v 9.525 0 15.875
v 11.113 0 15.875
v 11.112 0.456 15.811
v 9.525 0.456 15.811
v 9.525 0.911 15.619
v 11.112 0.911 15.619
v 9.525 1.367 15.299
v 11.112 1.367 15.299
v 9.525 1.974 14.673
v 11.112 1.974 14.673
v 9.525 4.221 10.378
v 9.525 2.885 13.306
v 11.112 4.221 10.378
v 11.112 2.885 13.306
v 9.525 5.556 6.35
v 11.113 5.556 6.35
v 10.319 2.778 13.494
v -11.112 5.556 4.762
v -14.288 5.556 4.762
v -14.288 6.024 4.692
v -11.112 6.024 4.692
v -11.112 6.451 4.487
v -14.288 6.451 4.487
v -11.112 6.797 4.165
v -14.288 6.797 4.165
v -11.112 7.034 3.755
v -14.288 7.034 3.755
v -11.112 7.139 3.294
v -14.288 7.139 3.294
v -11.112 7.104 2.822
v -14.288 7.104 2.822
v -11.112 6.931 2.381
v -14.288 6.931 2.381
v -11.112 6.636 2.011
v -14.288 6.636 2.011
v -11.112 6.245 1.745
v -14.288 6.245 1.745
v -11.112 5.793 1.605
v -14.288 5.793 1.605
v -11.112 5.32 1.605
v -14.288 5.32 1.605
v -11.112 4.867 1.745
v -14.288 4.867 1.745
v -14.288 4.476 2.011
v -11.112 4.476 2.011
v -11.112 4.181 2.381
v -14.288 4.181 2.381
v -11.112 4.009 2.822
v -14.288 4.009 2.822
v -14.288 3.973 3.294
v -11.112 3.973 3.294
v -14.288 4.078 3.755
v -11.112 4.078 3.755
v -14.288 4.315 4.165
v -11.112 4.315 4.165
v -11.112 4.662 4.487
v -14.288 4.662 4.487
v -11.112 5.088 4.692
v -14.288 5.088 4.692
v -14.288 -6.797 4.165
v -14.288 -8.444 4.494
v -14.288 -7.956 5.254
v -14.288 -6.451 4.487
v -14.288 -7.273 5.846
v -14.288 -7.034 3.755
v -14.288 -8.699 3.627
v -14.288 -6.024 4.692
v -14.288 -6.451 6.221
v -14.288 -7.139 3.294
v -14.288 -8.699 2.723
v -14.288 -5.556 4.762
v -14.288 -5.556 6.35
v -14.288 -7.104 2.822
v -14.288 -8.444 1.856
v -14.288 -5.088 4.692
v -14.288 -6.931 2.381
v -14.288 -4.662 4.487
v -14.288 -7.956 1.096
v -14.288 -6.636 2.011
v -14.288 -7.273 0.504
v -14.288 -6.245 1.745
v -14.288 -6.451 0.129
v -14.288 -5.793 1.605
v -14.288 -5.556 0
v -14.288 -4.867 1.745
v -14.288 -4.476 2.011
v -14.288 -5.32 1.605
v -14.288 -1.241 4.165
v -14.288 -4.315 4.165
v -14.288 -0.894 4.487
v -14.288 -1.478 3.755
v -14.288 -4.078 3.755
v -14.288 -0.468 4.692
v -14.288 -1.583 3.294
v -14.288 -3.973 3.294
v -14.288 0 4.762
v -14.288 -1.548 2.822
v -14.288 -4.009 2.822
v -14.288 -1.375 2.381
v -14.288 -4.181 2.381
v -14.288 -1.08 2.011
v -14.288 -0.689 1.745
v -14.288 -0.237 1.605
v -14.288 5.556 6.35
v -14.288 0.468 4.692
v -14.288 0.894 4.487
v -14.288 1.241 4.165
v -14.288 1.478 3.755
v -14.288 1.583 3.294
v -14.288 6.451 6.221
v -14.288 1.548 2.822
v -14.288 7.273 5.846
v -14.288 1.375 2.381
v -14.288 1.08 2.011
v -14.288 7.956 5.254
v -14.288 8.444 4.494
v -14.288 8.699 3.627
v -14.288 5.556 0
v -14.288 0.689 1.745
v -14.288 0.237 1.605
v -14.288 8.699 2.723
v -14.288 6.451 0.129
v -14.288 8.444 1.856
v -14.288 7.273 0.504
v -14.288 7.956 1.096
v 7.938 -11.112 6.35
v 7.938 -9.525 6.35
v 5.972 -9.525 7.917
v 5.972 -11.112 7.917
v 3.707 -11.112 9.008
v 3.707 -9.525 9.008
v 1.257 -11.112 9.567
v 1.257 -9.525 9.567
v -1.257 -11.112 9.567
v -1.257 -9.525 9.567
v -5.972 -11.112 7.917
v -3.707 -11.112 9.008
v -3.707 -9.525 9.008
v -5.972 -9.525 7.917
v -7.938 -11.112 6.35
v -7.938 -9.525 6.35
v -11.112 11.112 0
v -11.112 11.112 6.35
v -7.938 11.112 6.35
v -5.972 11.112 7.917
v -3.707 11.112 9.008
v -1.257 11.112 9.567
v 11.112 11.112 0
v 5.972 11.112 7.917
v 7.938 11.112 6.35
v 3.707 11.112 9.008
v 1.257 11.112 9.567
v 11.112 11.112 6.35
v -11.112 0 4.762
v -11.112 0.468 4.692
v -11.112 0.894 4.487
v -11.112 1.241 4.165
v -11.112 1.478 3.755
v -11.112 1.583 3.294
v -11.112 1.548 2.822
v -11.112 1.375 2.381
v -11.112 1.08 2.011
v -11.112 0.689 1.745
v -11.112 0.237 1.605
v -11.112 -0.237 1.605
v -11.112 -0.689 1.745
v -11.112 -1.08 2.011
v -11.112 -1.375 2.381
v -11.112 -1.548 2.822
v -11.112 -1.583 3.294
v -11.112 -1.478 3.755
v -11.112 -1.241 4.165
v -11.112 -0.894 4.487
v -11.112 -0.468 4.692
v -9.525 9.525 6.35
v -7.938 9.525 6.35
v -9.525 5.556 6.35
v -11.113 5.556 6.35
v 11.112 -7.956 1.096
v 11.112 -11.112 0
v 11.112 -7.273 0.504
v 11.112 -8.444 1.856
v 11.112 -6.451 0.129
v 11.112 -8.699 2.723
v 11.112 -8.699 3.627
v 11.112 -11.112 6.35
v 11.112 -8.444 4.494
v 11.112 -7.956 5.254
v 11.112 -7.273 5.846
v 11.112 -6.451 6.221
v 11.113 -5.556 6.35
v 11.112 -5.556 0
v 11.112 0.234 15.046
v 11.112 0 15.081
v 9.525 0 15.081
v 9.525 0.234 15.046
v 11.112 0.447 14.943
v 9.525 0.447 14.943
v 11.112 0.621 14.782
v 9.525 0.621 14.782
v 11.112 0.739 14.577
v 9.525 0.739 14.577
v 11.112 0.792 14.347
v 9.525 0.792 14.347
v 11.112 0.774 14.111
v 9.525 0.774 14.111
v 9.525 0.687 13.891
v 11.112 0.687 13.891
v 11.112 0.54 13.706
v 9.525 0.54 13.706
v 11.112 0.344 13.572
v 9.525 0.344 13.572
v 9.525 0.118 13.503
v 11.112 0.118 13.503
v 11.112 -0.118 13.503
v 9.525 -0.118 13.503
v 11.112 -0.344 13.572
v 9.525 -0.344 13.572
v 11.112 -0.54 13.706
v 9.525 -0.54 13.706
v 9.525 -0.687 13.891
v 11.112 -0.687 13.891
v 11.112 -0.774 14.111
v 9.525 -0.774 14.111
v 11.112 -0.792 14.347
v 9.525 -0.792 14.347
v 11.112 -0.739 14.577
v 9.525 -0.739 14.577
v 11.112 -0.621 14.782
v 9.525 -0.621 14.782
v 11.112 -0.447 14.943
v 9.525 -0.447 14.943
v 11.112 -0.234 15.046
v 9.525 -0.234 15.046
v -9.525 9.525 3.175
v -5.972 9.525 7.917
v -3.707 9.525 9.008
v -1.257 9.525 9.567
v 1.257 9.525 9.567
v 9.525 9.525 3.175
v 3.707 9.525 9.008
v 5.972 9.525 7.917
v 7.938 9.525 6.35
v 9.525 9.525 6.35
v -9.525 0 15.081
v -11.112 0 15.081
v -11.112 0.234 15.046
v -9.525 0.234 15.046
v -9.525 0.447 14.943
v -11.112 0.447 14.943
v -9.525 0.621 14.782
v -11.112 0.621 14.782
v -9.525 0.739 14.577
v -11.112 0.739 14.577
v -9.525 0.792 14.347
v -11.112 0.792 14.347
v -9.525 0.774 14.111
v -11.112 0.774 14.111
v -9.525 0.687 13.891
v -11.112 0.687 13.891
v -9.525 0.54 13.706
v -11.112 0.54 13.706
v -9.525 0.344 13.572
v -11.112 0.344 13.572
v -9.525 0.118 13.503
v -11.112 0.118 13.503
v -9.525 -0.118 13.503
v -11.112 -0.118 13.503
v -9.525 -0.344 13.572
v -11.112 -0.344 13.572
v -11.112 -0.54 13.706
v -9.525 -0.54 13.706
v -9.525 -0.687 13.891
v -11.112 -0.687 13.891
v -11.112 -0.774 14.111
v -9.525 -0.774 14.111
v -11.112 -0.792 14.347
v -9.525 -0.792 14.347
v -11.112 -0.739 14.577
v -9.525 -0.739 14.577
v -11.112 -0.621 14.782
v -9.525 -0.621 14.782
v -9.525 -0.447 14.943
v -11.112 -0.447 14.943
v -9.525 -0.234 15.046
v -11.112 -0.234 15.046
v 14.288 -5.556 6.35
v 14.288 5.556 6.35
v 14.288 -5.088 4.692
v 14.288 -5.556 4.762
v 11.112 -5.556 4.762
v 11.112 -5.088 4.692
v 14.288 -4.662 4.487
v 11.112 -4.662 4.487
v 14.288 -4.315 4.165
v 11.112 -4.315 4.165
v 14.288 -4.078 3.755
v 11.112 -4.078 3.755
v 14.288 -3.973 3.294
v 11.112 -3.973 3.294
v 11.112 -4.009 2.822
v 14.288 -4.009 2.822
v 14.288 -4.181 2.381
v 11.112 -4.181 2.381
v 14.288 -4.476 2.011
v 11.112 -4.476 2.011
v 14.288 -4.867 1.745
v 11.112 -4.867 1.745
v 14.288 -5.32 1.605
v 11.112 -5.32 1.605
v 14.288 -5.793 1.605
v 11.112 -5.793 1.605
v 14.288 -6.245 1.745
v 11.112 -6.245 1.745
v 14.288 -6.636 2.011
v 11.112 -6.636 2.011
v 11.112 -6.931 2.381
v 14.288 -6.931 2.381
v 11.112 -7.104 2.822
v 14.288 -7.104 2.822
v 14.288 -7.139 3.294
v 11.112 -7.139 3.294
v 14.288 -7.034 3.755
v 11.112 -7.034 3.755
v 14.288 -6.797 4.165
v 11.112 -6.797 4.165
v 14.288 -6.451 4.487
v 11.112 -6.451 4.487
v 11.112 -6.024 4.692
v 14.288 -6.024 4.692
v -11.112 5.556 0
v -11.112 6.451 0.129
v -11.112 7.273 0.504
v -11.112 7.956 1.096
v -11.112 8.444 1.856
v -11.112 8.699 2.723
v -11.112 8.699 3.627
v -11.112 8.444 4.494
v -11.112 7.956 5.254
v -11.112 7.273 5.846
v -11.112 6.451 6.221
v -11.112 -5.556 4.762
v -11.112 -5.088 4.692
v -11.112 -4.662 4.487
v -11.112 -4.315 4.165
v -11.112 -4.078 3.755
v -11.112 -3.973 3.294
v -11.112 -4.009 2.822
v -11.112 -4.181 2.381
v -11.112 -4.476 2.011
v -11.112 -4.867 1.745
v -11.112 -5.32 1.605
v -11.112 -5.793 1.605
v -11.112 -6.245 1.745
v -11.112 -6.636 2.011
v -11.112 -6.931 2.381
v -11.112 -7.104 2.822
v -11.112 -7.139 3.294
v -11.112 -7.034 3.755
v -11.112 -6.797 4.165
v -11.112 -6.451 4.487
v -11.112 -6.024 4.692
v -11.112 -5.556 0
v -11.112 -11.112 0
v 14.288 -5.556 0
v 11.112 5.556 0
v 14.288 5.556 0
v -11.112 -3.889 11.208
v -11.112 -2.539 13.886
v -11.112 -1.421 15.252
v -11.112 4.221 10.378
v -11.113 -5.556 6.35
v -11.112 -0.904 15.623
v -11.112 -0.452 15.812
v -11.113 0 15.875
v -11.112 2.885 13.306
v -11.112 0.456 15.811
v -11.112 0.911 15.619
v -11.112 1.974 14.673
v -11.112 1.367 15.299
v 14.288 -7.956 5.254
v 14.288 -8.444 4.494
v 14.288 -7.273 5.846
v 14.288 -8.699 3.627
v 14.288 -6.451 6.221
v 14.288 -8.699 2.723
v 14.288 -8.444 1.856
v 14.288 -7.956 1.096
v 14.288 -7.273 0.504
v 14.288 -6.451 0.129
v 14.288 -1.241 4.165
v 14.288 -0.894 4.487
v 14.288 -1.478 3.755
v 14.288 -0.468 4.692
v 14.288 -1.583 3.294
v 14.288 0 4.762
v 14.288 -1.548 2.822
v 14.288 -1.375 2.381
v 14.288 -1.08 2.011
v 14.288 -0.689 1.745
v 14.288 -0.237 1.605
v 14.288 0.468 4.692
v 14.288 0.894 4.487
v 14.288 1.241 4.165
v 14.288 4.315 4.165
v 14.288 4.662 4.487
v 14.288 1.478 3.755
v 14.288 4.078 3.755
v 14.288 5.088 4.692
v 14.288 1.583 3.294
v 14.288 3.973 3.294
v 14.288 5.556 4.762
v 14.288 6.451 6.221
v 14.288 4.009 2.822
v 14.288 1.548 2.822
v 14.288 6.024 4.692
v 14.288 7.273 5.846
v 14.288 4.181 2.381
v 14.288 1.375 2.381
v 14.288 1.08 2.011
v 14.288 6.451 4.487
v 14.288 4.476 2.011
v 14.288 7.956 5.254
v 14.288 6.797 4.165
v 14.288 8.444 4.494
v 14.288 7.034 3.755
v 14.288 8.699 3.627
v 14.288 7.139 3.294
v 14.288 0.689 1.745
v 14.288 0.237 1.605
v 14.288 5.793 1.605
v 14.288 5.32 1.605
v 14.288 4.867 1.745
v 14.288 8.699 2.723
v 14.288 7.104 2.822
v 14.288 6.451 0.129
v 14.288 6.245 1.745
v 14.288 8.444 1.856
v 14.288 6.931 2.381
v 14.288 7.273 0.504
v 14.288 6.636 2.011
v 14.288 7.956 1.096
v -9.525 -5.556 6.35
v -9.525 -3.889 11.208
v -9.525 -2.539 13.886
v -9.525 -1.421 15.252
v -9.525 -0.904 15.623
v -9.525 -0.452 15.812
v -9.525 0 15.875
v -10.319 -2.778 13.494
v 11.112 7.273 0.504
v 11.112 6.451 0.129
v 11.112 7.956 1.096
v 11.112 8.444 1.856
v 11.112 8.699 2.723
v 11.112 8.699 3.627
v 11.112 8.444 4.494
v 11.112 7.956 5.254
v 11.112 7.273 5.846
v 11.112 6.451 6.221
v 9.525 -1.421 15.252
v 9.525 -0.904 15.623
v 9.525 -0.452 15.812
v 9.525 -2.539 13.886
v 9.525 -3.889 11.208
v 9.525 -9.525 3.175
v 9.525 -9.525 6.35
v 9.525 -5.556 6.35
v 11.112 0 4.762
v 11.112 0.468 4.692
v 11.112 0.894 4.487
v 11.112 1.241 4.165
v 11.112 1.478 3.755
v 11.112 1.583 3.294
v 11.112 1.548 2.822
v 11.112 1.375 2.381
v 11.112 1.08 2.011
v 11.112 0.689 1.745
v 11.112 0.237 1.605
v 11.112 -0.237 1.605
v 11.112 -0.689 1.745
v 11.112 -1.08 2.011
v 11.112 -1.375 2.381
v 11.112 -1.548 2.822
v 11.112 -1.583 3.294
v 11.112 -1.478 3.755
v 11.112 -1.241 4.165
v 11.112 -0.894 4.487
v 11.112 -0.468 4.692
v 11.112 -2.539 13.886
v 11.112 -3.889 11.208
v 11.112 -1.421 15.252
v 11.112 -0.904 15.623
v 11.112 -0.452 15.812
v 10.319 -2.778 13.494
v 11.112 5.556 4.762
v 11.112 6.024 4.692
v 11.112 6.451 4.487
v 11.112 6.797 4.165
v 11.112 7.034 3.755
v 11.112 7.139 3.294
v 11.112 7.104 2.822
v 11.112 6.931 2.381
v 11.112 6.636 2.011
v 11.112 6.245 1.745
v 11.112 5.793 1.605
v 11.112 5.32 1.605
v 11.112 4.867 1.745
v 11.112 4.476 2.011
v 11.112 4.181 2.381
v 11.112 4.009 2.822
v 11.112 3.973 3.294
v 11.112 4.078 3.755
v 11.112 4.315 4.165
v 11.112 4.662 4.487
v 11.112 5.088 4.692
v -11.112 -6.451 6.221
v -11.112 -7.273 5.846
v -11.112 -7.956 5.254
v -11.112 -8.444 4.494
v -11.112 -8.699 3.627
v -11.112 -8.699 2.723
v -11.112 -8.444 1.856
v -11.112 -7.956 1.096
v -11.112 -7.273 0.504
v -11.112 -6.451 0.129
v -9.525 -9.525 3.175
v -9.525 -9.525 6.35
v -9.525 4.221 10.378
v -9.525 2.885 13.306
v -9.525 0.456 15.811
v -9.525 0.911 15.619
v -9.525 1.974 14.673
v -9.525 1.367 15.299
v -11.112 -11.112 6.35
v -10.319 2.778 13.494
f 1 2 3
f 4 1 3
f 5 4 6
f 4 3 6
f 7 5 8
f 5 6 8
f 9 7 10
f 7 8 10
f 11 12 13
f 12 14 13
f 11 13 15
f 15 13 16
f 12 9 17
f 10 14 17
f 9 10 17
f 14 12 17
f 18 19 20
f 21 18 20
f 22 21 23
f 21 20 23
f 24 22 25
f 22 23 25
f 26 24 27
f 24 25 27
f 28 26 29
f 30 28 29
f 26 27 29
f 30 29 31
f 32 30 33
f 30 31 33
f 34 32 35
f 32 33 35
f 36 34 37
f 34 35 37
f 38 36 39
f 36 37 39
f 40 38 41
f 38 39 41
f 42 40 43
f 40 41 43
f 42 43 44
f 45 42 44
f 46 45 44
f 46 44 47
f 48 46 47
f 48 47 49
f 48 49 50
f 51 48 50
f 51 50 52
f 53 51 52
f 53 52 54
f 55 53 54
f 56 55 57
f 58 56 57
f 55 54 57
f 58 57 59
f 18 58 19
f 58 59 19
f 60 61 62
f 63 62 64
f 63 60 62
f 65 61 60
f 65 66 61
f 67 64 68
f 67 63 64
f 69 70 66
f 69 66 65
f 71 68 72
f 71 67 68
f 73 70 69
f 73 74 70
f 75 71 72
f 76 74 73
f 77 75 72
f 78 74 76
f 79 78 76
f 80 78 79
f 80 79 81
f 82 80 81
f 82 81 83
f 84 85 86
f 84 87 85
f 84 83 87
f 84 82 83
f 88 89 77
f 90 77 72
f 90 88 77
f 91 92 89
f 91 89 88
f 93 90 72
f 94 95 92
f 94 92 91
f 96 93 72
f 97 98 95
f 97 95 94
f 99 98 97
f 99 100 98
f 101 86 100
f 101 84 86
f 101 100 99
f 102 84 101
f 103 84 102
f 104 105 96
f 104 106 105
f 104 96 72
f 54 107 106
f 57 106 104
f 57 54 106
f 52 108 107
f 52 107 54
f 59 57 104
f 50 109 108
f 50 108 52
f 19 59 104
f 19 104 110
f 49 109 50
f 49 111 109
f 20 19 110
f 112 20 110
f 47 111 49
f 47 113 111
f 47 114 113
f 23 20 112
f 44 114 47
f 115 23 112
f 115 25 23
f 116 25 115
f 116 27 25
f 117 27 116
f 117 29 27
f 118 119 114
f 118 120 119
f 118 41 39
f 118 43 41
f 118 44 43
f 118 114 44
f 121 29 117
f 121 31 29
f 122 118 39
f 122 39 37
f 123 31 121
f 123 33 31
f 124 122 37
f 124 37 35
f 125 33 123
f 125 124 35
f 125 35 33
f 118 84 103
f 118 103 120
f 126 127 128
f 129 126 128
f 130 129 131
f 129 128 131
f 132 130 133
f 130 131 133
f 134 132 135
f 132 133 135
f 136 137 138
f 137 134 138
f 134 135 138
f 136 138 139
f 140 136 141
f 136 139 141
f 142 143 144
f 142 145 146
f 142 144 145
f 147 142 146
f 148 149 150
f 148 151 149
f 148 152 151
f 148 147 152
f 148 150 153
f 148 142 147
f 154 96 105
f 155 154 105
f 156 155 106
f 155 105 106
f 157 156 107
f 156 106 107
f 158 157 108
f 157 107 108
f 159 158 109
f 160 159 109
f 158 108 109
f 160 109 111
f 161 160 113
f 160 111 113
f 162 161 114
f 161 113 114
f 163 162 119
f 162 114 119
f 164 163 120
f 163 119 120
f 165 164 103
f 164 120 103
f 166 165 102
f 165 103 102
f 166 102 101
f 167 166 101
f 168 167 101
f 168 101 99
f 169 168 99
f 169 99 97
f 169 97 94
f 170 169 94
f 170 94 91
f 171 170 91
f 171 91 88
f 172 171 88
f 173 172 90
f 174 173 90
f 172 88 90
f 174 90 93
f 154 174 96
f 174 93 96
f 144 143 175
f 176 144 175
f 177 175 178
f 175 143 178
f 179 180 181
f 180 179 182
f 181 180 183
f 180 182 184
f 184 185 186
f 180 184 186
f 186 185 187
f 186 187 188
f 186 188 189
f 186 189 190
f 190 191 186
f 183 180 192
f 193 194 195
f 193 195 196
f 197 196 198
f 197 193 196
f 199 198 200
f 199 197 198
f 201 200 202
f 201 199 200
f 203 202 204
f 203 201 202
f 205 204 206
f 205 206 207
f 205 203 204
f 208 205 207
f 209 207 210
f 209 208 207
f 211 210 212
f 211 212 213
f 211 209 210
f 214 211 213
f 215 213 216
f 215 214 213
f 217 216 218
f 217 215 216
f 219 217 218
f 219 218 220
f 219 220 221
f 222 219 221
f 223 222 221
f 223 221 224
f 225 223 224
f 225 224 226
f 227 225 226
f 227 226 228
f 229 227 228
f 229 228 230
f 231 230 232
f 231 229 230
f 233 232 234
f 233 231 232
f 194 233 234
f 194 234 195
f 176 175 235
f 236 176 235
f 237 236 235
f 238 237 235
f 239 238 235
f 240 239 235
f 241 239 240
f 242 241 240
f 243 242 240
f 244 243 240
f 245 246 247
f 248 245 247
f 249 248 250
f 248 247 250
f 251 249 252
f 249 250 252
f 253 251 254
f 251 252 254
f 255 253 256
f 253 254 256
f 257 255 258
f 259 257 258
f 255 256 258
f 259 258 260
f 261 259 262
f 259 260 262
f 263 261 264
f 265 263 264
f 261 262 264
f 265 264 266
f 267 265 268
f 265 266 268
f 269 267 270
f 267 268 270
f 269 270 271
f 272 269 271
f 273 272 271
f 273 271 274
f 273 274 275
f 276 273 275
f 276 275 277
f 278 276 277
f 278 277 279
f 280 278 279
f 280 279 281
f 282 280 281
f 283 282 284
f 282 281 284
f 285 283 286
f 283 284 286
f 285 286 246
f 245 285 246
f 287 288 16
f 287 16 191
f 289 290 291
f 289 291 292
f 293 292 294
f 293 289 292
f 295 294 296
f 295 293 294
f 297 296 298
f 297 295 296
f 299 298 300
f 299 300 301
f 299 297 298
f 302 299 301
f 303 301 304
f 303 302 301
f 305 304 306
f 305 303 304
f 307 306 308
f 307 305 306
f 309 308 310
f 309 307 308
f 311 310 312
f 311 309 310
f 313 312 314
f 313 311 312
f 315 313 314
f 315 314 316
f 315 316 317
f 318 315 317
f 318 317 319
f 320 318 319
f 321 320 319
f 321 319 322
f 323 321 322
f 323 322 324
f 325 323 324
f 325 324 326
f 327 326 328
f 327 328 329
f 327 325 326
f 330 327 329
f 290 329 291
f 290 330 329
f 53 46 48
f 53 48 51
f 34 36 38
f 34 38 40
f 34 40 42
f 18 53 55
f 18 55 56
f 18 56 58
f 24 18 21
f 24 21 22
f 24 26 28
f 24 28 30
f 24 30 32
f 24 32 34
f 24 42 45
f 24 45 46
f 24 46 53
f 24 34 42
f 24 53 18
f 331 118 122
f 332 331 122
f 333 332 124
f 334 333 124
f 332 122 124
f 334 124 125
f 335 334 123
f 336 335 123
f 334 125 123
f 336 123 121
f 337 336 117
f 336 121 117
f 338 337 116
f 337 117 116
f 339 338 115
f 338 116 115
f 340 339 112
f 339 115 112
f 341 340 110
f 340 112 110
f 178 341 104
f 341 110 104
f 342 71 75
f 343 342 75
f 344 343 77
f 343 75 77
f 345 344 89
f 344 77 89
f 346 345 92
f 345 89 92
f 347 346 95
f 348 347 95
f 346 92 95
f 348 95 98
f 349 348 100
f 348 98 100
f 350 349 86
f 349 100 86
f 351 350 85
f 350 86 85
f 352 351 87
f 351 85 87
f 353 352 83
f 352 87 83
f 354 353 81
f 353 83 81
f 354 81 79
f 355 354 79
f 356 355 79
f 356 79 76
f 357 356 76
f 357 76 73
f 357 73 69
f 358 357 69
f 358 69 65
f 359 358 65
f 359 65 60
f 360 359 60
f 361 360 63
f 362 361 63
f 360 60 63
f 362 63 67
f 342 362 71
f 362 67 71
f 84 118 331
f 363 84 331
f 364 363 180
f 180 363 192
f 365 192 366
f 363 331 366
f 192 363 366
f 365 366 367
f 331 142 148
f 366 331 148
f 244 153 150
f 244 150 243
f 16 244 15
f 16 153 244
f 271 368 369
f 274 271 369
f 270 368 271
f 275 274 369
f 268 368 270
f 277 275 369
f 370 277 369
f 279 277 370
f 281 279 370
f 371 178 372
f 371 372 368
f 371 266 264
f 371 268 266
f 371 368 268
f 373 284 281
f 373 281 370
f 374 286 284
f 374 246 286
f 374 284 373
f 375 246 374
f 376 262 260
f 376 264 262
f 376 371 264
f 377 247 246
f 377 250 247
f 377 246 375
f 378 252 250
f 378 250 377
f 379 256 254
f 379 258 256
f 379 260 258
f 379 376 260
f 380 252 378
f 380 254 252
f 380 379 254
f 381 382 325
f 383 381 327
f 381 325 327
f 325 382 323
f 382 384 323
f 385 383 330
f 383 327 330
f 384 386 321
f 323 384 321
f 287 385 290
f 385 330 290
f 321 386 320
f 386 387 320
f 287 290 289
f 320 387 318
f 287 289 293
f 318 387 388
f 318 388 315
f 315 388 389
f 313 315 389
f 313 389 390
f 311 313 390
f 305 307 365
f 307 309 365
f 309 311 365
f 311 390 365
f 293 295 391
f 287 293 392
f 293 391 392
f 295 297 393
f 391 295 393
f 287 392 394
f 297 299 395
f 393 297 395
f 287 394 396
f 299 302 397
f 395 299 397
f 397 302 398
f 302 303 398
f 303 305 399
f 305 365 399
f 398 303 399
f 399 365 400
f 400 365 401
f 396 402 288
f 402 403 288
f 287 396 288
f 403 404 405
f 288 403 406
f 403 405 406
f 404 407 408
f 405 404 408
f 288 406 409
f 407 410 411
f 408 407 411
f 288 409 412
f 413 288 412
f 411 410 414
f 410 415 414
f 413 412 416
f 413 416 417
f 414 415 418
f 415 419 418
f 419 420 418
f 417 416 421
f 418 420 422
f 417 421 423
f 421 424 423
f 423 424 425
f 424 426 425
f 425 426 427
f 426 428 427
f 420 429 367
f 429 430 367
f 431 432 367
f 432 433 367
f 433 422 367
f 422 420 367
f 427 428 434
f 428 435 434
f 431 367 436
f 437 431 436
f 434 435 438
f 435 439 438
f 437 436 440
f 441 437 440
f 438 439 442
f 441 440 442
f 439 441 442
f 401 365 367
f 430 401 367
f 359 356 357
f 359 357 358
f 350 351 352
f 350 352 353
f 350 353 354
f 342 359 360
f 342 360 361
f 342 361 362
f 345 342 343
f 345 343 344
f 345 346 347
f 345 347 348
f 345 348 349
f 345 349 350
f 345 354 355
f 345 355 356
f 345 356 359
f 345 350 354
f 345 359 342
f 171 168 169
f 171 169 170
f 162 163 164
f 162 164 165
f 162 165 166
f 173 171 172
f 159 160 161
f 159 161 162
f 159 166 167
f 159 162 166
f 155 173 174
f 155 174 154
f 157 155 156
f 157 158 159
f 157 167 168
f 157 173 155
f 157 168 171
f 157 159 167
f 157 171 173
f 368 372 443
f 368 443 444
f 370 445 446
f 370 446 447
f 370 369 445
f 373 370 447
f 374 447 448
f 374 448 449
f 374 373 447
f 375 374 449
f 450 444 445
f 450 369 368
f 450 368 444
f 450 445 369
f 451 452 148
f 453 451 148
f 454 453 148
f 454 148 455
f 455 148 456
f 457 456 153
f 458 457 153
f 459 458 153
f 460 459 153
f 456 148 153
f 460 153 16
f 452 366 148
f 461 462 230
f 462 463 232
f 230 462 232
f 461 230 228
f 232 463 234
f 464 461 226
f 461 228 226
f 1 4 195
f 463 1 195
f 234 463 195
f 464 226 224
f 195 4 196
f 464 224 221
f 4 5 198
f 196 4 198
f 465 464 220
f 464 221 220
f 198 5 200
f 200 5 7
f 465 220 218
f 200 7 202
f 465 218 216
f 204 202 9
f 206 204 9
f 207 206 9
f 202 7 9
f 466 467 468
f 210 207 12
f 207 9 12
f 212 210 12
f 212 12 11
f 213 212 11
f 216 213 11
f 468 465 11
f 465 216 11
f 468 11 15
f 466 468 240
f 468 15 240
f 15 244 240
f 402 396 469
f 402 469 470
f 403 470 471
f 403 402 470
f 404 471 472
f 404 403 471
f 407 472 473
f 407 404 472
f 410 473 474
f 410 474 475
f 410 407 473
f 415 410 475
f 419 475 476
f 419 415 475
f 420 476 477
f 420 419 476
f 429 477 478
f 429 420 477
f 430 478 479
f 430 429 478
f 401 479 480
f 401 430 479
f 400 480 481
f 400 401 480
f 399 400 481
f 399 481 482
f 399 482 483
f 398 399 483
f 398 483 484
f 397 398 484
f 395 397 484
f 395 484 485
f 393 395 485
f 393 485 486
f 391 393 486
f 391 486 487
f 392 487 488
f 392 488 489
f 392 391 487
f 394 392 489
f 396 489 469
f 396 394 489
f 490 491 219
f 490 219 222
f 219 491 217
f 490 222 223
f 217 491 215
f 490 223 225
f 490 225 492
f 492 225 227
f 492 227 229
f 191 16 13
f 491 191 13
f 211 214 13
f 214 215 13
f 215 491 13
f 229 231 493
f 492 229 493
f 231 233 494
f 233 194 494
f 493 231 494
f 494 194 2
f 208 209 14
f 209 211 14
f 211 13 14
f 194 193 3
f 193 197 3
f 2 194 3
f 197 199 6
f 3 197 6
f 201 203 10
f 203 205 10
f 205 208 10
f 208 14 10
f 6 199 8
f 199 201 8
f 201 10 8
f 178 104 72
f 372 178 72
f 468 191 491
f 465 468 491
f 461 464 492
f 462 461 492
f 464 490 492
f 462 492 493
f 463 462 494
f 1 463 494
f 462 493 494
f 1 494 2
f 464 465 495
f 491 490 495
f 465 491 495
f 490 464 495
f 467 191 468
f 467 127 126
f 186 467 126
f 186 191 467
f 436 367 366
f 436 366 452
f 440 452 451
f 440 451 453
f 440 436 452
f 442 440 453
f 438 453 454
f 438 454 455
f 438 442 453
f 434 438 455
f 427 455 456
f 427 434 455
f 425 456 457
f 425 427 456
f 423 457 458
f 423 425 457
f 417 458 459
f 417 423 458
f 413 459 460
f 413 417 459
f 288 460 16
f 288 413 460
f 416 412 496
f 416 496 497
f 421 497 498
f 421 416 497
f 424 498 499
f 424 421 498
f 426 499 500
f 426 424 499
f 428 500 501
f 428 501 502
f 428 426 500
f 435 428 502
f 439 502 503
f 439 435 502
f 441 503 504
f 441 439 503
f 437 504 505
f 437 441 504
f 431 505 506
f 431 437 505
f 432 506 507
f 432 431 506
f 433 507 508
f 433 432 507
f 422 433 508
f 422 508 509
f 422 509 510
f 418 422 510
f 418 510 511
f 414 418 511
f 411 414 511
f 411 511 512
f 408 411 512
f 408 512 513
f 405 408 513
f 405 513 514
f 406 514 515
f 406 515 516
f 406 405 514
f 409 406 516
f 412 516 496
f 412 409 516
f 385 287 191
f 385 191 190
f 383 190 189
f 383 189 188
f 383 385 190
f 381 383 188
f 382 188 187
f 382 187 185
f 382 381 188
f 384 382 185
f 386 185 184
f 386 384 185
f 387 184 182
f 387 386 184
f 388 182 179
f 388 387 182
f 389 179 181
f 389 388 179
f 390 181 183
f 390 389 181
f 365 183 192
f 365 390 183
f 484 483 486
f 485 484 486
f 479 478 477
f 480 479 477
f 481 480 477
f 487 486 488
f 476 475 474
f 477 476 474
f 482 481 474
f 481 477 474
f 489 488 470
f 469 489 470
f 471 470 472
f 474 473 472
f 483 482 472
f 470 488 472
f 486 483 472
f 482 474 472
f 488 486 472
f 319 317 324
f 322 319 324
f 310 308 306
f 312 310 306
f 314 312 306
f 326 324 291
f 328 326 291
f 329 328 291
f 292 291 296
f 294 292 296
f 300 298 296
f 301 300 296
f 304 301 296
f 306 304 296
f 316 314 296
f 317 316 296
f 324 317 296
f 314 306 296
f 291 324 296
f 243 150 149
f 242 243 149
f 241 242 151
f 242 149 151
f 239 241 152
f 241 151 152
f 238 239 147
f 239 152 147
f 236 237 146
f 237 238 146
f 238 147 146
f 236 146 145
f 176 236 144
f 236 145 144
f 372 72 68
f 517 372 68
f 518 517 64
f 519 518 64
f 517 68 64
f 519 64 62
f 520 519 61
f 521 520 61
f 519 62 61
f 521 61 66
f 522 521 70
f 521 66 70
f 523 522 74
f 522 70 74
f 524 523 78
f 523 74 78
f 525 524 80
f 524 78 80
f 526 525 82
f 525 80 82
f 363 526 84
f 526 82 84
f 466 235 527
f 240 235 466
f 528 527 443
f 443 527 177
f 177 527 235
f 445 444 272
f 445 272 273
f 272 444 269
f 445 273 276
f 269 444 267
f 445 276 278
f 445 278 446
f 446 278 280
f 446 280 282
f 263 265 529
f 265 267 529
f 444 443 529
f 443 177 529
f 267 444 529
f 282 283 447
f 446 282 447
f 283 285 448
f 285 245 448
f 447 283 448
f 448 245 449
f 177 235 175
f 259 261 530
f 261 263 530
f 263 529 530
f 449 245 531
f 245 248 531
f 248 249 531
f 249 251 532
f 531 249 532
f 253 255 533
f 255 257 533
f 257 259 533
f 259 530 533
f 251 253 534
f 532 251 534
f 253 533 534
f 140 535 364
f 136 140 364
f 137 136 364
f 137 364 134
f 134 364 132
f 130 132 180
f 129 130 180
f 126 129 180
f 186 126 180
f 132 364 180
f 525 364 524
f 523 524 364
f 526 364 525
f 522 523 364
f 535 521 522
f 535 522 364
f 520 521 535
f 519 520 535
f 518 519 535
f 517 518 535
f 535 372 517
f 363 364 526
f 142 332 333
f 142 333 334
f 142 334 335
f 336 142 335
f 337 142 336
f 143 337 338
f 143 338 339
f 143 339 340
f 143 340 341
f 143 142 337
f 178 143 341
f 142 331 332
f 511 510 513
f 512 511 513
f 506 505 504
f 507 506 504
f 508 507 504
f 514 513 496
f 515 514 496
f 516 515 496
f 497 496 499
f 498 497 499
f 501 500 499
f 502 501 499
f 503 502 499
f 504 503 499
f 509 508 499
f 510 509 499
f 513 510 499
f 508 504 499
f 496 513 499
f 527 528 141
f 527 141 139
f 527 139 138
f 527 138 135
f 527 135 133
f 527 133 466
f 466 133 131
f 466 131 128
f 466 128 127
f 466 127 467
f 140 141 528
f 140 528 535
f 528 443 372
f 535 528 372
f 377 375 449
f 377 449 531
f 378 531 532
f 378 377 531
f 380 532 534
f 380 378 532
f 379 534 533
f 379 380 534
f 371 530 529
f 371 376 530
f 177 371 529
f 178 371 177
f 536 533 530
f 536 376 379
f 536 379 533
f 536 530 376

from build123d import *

# Parameters (mm, degrees)
SKETCH2_W           = 28.575
SKETCH2_H           = 22.225
BOSS_EXTRUDE1_DEPTH = 15.875
SKETCH5_W           = 19.05
SKETCH5_H           = 19.05
CUT_EXTRUDE3_DEPTH  = 12.7
SKETCH4_R           = 1.5875
CUT_EXTRUDE2_DEPTH  = 3.175
CUT_EXTRUDE1_DEPTH  = 23.225
SKETCH6_R           = 0.79375
CUT_EXTRUDE4_DEPTH  = 1.5875


with BuildPart() as part:
    # Sketch2 → Boss-Extrude1 (new body)
    with BuildSketch(Plane.XY):
        Rectangle(SKETCH2_W, SKETCH2_H)
    extrude(amount=BOSS_EXTRUDE1_DEPTH)

    # Sketch5 → Cut-Extrude3 (cut)
    with BuildSketch(Plane.XY.offset(15.875)):
        Rectangle(SKETCH5_W, SKETCH5_H)
    extrude(amount=-CUT_EXTRUDE3_DEPTH, mode=Mode.SUBTRACT)

    # Sketch4 → Cut-Extrude2 (cut)
    with BuildSketch(Plane.ZY.offset(14.2875)):
        with BuildLine():
            ThreePointArc((6.35, -5.55625), (3.175, -8.73125), (0, -5.55625))
            Line((0, -5.55625), (0, -11.1125))
            Line((0, -11.1125), (15.875, -11.1125))
            Line((15.875, -11.1125), (15.875, 11.1125))
            Line((15.875, 11.1125), (0, 11.1125))
            Line((0, 11.1125), (0, 5.55625))
            ThreePointArc((0, 5.55625), (3.175, 8.73125), (6.35, 5.55625))
            Line((6.35, 5.55625), (6.35, -5.55625))
        make_face()
        with Locations((3.175, 5.55625)):
            Circle(SKETCH4_R)
        with Locations((3.175, 0)):
            Circle(SKETCH4_R)
        with Locations((3.175, -5.55625)):
            Circle(SKETCH4_R)
    cut_extrude2 = extrude(amount=-CUT_EXTRUDE2_DEPTH, mode=Mode.SUBTRACT)

    # Mirror1: Cut-Extrude2 across plane
    add(cut_extrude2.mirror(Plane(origin=(0, 0, 0), x_dir=(0, 0, 1), z_dir=(1, 0, 0))), mode=Mode.SUBTRACT)

    # Sketch3 → Cut-Extrude1 (cut, through all)
    with BuildSketch(Plane(origin=(0, 11.1125, 0), x_dir=(1, 0, 0), z_dir=(0, 1, 0))):
        with BuildLine():
            Line((-7.9375, -6.35), (-9.525, -6.35))
            Line((-9.525, -6.35), (-9.525, -15.875))
            Line((-9.525, -15.875), (9.525, -15.875))
            Line((9.525, -15.875), (9.525, -6.35))
            Line((9.525, -6.35), (7.9375, -6.35))
            ThreePointArc((7.9375, -6.35), (0, -9.637820151), (-7.9375, -6.35))
        make_face()
    extrude(amount=-CUT_EXTRUDE1_DEPTH, mode=Mode.SUBTRACT)

    # Sketch6 → Cut-Extrude4 (cut)
    with BuildSketch(Plane.ZY.offset(11.1125)):
        with BuildLine():
            Line((15.875, -11.1125), (15.875, 0))
            add(Edge.make_bspline(
                [(6.35, -5.55625), (15.875, -2.778125), (15.875, 0)],
                knots=[0, 0, 0, 0.5, 0.5, 0.5], degree=2))
            Line((6.35, -5.55625), (6.35, -11.1125))
            Line((6.35, -11.1125), (15.875, -11.1125))
        make_face()
        with BuildLine():
            Line((6.35, 11.1125), (6.35, 5.55625))
            add(Edge.make_bspline(
                [(15.875, 0), (15.875, 2.778125), (6.35, 5.55625)],
                knots=[0.5, 0.5, 0.5, 1, 1, 1], degree=2))
            Line((15.875, 0), (15.875, 11.1125))
            Line((15.875, 11.1125), (6.35, 11.1125))
        make_face()
        with Locations((14.2875, 0)):
            Circle(SKETCH6_R)
    cut_extrude4 = extrude(amount=-CUT_EXTRUDE4_DEPTH, mode=Mode.SUBTRACT)

    # Mirror2: Cut-Extrude4 across plane
    add(cut_extrude4.mirror(Plane(origin=(0, 0, 0), x_dir=(0, 0, 1), z_dir=(1, 0, 0))), mode=Mode.SUBTRACT)


solid = part.part
